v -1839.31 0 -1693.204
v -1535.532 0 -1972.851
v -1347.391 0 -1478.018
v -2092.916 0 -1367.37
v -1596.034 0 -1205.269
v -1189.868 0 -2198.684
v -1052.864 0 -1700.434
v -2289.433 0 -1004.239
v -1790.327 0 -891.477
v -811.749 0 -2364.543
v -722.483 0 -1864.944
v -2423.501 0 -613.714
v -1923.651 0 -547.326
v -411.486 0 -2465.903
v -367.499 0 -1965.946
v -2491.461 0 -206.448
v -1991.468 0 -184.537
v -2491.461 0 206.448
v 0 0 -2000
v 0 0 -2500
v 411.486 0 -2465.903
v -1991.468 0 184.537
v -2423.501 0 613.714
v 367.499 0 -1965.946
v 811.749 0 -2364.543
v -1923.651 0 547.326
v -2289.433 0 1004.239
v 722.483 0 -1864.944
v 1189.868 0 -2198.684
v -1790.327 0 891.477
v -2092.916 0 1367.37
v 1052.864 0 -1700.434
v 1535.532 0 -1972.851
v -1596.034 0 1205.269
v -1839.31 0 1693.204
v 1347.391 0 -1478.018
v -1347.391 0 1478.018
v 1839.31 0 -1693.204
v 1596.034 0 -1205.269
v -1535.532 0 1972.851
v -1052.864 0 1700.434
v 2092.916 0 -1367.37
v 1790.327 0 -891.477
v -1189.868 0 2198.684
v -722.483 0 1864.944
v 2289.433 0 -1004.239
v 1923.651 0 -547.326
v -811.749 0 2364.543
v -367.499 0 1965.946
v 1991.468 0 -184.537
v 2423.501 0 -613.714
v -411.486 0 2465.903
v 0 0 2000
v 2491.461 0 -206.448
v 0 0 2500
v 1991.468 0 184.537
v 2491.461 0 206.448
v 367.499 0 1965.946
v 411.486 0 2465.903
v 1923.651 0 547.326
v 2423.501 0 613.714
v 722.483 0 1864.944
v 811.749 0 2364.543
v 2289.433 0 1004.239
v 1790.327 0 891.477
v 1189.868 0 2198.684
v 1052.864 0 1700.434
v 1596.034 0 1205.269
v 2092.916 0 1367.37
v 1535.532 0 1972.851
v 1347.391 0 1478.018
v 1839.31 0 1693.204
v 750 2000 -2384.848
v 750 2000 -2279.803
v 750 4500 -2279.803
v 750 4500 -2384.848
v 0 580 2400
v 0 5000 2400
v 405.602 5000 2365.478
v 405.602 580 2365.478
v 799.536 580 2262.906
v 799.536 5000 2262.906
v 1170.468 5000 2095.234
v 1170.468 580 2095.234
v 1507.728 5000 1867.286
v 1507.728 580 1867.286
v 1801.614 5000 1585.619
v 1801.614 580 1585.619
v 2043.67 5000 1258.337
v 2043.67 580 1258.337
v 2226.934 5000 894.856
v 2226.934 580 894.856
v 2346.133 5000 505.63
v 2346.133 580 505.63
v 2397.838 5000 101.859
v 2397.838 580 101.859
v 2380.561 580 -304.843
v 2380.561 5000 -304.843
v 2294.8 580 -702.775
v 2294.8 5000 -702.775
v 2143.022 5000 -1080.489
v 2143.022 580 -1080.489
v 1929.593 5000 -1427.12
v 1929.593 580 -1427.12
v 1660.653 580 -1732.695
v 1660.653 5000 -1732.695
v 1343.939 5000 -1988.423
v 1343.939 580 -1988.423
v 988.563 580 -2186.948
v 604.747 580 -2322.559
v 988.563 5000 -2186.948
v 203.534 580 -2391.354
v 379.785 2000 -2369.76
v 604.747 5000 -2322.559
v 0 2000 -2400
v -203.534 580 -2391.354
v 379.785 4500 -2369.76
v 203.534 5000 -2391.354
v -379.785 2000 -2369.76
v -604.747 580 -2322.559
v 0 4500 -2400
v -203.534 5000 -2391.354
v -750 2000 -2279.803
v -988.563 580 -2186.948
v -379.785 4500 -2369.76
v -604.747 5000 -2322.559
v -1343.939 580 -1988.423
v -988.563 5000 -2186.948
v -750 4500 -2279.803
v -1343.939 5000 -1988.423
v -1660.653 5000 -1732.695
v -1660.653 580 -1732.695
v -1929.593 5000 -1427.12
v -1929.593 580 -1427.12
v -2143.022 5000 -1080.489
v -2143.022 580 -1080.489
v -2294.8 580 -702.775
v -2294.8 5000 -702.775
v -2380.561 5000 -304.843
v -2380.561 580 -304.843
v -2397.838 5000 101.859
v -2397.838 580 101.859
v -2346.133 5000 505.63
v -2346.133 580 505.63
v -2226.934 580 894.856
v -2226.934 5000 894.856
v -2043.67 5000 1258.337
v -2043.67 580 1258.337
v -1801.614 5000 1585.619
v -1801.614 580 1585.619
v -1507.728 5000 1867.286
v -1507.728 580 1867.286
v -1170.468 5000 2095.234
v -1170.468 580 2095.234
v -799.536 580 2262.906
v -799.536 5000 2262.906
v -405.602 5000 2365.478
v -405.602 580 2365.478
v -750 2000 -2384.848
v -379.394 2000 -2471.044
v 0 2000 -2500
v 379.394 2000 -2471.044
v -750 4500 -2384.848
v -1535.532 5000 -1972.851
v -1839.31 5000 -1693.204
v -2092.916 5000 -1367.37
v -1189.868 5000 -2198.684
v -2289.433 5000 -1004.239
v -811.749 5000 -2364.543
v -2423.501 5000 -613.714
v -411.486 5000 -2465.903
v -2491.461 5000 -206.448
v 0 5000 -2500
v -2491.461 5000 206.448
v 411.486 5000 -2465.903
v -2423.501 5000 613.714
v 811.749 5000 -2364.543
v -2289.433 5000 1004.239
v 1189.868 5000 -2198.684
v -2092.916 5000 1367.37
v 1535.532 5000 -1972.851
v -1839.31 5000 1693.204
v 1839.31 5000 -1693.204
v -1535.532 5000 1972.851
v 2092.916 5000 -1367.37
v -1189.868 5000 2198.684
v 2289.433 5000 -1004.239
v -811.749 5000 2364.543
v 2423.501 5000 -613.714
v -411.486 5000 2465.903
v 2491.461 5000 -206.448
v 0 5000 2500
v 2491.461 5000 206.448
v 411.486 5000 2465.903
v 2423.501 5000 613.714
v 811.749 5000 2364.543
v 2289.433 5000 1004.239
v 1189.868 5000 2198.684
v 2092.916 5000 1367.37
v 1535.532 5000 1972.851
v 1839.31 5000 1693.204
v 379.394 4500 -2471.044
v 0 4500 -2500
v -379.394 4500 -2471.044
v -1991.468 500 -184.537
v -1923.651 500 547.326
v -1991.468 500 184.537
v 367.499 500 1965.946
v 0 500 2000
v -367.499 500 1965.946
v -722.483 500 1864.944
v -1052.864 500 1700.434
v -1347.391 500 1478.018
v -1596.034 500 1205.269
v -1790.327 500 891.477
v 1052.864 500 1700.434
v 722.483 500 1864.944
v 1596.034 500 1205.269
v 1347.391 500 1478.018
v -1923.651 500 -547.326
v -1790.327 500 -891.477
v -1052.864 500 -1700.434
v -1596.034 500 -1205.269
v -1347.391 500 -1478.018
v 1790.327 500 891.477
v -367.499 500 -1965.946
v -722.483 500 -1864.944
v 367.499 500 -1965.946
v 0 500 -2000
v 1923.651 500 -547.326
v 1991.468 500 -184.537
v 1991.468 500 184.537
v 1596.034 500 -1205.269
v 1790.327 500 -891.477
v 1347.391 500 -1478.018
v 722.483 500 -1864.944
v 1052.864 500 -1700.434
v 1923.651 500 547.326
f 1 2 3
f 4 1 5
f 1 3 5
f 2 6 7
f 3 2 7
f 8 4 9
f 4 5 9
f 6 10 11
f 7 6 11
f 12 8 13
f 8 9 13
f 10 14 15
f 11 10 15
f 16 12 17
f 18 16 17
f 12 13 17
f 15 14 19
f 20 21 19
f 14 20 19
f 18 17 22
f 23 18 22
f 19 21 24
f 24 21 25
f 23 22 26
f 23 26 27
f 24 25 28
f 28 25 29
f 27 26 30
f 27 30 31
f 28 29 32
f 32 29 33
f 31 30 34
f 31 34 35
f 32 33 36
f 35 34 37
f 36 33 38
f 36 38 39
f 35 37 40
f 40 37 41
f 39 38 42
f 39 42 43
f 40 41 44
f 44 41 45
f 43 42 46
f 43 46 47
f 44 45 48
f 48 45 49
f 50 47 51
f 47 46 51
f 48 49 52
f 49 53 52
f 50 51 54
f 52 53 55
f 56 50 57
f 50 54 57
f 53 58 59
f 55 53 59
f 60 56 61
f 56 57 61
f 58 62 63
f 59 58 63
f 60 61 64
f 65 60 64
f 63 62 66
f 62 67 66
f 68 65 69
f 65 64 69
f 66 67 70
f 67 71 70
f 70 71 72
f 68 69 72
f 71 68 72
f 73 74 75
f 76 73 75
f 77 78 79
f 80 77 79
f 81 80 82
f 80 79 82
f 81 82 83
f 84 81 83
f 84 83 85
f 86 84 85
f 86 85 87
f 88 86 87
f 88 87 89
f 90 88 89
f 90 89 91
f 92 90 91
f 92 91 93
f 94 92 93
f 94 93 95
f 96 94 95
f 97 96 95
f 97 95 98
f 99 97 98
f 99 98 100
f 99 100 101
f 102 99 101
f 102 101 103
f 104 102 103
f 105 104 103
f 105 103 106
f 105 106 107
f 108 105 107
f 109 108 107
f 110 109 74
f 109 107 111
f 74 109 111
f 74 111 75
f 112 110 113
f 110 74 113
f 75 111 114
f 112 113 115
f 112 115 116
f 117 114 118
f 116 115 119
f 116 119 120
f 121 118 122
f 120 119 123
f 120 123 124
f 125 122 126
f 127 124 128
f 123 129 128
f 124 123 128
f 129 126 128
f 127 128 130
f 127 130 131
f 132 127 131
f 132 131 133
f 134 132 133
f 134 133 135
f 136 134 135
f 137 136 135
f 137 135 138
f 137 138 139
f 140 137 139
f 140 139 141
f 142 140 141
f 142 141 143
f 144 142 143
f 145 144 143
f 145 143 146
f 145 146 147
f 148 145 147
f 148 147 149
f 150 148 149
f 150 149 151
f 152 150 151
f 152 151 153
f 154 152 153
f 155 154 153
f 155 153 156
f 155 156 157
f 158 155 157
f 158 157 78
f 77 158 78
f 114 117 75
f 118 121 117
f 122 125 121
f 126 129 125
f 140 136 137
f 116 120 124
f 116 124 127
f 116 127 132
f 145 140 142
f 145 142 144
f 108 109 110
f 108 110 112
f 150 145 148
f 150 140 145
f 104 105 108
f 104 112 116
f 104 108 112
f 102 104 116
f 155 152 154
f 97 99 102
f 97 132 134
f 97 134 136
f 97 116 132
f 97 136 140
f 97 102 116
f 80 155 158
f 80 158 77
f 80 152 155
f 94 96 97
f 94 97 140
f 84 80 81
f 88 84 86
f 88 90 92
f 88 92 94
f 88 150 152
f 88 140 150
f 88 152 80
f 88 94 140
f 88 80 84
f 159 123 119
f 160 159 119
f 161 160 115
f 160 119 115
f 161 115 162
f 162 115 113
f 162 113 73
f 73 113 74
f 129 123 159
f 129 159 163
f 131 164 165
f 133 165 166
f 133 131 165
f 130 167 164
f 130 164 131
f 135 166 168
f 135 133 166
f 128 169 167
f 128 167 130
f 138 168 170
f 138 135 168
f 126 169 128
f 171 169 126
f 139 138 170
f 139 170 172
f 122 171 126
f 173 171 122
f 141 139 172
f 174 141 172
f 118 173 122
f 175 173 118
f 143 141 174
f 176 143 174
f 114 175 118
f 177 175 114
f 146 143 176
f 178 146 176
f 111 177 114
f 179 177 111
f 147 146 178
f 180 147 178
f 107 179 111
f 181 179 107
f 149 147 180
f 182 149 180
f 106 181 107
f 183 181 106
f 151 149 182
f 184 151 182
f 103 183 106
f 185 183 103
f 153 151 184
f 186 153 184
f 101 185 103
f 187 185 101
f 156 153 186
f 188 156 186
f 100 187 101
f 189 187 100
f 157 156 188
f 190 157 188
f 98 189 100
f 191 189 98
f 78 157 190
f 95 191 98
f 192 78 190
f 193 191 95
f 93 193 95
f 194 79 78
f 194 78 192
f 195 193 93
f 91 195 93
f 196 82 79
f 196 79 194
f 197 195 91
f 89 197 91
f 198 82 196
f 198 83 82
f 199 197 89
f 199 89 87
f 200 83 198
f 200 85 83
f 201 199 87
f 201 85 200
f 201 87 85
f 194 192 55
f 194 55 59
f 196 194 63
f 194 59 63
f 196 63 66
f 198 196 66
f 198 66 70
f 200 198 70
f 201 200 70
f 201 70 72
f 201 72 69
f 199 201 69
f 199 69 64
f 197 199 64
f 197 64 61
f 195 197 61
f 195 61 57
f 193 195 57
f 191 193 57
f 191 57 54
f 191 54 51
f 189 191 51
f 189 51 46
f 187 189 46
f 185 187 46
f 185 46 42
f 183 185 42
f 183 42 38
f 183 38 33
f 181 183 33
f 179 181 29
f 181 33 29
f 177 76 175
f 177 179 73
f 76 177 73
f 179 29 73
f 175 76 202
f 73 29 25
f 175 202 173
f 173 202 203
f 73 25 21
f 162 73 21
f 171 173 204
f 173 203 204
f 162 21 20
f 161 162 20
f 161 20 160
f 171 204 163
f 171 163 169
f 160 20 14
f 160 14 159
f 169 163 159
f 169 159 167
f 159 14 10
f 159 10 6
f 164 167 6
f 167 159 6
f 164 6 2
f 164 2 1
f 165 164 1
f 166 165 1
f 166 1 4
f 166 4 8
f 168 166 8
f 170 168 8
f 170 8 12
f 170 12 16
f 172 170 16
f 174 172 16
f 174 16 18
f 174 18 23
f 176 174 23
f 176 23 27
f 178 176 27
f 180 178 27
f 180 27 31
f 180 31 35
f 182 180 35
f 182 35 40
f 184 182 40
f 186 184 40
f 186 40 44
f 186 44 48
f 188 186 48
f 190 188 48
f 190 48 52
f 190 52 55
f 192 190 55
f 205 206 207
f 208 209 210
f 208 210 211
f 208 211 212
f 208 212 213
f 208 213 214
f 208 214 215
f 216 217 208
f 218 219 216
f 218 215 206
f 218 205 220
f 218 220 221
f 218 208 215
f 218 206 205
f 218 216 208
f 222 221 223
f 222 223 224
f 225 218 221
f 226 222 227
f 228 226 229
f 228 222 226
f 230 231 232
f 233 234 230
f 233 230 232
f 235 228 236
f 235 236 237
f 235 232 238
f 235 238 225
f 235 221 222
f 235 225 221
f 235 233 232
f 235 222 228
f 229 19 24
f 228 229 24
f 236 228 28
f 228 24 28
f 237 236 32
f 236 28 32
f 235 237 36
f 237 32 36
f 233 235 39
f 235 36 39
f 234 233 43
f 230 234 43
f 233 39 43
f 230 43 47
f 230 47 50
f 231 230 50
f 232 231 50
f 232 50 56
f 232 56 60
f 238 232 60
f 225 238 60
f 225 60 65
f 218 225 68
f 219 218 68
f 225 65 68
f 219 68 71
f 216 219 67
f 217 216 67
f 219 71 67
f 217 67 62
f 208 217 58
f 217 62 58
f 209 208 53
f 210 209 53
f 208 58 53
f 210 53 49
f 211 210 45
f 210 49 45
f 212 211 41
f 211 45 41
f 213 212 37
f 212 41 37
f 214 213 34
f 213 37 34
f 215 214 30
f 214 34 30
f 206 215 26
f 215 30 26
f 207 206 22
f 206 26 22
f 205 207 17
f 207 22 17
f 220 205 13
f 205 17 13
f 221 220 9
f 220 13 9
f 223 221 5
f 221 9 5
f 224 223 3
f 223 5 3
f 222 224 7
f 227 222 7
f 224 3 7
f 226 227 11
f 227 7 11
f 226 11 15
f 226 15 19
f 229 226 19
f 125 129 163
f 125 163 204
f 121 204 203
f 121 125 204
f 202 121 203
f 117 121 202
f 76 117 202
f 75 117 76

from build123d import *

# Parameters (mm, degrees)
SKETCH1_R           = 2500
BOSS_EXTRUDE1_DEPTH = 5000
SKETCH2_R           = 2000
CUT_EXTRUDE1_DEPTH  = 500
SKETCH3_R           = 2400
CUT_EXTRUDE2_DEPTH  = 4420
SKETCH4_W           = 1500
SKETCH4_H           = 2500
CUT_EXTRUDE3_DEPTH  = 4420


with BuildPart() as part:
    # Sketch1 → Boss-Extrude1 (new body)
    with BuildSketch(Plane(origin=(0, 0, 0), x_dir=(1, 0, 0), z_dir=(0, 1, 0))):
        with Locations(Location((0, 0, 0), (0, 0, 270))):
            Circle(SKETCH1_R)
    extrude(amount=BOSS_EXTRUDE1_DEPTH)

    # Sketch2 → Cut-Extrude1 (cut)
    with BuildSketch(Plane.XZ):
        with Locations(Location((0, 0, 0), (0, 0, 270))):
            Circle(SKETCH2_R)
    extrude(amount=-CUT_EXTRUDE1_DEPTH, mode=Mode.SUBTRACT)

    # Sketch3 → Cut-Extrude2 (cut)
    with BuildSketch(Plane(origin=(0, 5000, 0), x_dir=(1, 0, 0), z_dir=(0, 1, 0))):
        with Locations(Location((0, 0, 0), (0, 0, 270))):
            Circle(SKETCH3_R)
    extrude(amount=-CUT_EXTRUDE2_DEPTH, mode=Mode.SUBTRACT)

    # Sketch4 → Cut-Extrude3 (cut)
    with BuildSketch(Plane.XY):
        with Locations((0, 3250)):
            Rectangle(SKETCH4_W, SKETCH4_H)
    extrude(amount=-CUT_EXTRUDE3_DEPTH, mode=Mode.SUBTRACT)


solid = part.part
